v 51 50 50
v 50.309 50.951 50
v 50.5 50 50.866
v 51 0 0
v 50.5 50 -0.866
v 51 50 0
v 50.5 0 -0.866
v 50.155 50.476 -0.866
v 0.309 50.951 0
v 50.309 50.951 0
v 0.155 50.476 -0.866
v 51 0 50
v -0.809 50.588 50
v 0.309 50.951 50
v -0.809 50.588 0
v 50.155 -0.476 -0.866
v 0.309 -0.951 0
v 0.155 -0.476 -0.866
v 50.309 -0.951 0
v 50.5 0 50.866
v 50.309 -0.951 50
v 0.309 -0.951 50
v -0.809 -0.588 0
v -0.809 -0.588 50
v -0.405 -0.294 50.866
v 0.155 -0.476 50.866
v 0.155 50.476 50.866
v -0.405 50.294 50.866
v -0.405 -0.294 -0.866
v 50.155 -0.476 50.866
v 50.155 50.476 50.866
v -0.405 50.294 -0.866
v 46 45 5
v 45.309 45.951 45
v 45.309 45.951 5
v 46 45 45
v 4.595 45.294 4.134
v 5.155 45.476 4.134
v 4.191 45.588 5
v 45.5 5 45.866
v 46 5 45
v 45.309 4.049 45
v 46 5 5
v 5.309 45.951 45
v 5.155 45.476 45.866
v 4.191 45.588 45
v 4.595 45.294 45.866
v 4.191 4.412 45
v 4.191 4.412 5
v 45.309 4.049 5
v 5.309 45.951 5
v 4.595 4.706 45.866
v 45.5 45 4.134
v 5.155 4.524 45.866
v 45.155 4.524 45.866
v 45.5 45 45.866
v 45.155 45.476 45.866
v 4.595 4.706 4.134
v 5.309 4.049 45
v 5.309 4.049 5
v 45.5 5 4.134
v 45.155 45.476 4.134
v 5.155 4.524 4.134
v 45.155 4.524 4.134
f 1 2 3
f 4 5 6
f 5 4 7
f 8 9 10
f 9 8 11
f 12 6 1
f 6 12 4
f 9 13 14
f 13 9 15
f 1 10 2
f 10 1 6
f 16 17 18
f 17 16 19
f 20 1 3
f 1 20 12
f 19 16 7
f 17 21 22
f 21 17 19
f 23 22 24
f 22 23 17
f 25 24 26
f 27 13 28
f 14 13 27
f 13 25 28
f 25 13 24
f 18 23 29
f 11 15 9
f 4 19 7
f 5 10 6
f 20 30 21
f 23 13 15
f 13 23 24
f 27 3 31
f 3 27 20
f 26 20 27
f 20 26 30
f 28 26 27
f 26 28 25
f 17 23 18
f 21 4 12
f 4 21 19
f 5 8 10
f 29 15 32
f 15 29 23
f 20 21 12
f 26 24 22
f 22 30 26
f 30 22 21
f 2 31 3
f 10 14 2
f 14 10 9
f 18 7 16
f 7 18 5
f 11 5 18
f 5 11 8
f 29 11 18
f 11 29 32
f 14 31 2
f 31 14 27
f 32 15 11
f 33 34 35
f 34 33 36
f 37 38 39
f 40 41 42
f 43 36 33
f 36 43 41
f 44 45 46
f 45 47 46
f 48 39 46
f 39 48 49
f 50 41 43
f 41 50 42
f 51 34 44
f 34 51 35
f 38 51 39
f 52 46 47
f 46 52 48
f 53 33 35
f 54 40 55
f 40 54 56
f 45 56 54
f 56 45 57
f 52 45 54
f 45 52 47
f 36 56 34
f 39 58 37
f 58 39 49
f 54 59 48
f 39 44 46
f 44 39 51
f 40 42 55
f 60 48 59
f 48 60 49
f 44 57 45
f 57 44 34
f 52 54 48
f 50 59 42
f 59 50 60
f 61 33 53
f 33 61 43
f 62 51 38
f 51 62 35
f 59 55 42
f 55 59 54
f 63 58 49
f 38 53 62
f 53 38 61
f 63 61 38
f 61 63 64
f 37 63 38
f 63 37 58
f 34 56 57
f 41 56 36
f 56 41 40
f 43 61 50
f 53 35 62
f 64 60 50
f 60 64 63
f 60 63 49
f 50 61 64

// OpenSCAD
length = 50;      
thickness = 5;    
fillet_radius = 1;     

difference() {
        minkowski() {
        cube(length);          
        sphere(fillet_radius);     
    }
    translate([thickness,thickness,thickness])
    minkowski() {
        cube(length - 2 * thickness);  
        sphere(fillet_radius);                    
    }
}
